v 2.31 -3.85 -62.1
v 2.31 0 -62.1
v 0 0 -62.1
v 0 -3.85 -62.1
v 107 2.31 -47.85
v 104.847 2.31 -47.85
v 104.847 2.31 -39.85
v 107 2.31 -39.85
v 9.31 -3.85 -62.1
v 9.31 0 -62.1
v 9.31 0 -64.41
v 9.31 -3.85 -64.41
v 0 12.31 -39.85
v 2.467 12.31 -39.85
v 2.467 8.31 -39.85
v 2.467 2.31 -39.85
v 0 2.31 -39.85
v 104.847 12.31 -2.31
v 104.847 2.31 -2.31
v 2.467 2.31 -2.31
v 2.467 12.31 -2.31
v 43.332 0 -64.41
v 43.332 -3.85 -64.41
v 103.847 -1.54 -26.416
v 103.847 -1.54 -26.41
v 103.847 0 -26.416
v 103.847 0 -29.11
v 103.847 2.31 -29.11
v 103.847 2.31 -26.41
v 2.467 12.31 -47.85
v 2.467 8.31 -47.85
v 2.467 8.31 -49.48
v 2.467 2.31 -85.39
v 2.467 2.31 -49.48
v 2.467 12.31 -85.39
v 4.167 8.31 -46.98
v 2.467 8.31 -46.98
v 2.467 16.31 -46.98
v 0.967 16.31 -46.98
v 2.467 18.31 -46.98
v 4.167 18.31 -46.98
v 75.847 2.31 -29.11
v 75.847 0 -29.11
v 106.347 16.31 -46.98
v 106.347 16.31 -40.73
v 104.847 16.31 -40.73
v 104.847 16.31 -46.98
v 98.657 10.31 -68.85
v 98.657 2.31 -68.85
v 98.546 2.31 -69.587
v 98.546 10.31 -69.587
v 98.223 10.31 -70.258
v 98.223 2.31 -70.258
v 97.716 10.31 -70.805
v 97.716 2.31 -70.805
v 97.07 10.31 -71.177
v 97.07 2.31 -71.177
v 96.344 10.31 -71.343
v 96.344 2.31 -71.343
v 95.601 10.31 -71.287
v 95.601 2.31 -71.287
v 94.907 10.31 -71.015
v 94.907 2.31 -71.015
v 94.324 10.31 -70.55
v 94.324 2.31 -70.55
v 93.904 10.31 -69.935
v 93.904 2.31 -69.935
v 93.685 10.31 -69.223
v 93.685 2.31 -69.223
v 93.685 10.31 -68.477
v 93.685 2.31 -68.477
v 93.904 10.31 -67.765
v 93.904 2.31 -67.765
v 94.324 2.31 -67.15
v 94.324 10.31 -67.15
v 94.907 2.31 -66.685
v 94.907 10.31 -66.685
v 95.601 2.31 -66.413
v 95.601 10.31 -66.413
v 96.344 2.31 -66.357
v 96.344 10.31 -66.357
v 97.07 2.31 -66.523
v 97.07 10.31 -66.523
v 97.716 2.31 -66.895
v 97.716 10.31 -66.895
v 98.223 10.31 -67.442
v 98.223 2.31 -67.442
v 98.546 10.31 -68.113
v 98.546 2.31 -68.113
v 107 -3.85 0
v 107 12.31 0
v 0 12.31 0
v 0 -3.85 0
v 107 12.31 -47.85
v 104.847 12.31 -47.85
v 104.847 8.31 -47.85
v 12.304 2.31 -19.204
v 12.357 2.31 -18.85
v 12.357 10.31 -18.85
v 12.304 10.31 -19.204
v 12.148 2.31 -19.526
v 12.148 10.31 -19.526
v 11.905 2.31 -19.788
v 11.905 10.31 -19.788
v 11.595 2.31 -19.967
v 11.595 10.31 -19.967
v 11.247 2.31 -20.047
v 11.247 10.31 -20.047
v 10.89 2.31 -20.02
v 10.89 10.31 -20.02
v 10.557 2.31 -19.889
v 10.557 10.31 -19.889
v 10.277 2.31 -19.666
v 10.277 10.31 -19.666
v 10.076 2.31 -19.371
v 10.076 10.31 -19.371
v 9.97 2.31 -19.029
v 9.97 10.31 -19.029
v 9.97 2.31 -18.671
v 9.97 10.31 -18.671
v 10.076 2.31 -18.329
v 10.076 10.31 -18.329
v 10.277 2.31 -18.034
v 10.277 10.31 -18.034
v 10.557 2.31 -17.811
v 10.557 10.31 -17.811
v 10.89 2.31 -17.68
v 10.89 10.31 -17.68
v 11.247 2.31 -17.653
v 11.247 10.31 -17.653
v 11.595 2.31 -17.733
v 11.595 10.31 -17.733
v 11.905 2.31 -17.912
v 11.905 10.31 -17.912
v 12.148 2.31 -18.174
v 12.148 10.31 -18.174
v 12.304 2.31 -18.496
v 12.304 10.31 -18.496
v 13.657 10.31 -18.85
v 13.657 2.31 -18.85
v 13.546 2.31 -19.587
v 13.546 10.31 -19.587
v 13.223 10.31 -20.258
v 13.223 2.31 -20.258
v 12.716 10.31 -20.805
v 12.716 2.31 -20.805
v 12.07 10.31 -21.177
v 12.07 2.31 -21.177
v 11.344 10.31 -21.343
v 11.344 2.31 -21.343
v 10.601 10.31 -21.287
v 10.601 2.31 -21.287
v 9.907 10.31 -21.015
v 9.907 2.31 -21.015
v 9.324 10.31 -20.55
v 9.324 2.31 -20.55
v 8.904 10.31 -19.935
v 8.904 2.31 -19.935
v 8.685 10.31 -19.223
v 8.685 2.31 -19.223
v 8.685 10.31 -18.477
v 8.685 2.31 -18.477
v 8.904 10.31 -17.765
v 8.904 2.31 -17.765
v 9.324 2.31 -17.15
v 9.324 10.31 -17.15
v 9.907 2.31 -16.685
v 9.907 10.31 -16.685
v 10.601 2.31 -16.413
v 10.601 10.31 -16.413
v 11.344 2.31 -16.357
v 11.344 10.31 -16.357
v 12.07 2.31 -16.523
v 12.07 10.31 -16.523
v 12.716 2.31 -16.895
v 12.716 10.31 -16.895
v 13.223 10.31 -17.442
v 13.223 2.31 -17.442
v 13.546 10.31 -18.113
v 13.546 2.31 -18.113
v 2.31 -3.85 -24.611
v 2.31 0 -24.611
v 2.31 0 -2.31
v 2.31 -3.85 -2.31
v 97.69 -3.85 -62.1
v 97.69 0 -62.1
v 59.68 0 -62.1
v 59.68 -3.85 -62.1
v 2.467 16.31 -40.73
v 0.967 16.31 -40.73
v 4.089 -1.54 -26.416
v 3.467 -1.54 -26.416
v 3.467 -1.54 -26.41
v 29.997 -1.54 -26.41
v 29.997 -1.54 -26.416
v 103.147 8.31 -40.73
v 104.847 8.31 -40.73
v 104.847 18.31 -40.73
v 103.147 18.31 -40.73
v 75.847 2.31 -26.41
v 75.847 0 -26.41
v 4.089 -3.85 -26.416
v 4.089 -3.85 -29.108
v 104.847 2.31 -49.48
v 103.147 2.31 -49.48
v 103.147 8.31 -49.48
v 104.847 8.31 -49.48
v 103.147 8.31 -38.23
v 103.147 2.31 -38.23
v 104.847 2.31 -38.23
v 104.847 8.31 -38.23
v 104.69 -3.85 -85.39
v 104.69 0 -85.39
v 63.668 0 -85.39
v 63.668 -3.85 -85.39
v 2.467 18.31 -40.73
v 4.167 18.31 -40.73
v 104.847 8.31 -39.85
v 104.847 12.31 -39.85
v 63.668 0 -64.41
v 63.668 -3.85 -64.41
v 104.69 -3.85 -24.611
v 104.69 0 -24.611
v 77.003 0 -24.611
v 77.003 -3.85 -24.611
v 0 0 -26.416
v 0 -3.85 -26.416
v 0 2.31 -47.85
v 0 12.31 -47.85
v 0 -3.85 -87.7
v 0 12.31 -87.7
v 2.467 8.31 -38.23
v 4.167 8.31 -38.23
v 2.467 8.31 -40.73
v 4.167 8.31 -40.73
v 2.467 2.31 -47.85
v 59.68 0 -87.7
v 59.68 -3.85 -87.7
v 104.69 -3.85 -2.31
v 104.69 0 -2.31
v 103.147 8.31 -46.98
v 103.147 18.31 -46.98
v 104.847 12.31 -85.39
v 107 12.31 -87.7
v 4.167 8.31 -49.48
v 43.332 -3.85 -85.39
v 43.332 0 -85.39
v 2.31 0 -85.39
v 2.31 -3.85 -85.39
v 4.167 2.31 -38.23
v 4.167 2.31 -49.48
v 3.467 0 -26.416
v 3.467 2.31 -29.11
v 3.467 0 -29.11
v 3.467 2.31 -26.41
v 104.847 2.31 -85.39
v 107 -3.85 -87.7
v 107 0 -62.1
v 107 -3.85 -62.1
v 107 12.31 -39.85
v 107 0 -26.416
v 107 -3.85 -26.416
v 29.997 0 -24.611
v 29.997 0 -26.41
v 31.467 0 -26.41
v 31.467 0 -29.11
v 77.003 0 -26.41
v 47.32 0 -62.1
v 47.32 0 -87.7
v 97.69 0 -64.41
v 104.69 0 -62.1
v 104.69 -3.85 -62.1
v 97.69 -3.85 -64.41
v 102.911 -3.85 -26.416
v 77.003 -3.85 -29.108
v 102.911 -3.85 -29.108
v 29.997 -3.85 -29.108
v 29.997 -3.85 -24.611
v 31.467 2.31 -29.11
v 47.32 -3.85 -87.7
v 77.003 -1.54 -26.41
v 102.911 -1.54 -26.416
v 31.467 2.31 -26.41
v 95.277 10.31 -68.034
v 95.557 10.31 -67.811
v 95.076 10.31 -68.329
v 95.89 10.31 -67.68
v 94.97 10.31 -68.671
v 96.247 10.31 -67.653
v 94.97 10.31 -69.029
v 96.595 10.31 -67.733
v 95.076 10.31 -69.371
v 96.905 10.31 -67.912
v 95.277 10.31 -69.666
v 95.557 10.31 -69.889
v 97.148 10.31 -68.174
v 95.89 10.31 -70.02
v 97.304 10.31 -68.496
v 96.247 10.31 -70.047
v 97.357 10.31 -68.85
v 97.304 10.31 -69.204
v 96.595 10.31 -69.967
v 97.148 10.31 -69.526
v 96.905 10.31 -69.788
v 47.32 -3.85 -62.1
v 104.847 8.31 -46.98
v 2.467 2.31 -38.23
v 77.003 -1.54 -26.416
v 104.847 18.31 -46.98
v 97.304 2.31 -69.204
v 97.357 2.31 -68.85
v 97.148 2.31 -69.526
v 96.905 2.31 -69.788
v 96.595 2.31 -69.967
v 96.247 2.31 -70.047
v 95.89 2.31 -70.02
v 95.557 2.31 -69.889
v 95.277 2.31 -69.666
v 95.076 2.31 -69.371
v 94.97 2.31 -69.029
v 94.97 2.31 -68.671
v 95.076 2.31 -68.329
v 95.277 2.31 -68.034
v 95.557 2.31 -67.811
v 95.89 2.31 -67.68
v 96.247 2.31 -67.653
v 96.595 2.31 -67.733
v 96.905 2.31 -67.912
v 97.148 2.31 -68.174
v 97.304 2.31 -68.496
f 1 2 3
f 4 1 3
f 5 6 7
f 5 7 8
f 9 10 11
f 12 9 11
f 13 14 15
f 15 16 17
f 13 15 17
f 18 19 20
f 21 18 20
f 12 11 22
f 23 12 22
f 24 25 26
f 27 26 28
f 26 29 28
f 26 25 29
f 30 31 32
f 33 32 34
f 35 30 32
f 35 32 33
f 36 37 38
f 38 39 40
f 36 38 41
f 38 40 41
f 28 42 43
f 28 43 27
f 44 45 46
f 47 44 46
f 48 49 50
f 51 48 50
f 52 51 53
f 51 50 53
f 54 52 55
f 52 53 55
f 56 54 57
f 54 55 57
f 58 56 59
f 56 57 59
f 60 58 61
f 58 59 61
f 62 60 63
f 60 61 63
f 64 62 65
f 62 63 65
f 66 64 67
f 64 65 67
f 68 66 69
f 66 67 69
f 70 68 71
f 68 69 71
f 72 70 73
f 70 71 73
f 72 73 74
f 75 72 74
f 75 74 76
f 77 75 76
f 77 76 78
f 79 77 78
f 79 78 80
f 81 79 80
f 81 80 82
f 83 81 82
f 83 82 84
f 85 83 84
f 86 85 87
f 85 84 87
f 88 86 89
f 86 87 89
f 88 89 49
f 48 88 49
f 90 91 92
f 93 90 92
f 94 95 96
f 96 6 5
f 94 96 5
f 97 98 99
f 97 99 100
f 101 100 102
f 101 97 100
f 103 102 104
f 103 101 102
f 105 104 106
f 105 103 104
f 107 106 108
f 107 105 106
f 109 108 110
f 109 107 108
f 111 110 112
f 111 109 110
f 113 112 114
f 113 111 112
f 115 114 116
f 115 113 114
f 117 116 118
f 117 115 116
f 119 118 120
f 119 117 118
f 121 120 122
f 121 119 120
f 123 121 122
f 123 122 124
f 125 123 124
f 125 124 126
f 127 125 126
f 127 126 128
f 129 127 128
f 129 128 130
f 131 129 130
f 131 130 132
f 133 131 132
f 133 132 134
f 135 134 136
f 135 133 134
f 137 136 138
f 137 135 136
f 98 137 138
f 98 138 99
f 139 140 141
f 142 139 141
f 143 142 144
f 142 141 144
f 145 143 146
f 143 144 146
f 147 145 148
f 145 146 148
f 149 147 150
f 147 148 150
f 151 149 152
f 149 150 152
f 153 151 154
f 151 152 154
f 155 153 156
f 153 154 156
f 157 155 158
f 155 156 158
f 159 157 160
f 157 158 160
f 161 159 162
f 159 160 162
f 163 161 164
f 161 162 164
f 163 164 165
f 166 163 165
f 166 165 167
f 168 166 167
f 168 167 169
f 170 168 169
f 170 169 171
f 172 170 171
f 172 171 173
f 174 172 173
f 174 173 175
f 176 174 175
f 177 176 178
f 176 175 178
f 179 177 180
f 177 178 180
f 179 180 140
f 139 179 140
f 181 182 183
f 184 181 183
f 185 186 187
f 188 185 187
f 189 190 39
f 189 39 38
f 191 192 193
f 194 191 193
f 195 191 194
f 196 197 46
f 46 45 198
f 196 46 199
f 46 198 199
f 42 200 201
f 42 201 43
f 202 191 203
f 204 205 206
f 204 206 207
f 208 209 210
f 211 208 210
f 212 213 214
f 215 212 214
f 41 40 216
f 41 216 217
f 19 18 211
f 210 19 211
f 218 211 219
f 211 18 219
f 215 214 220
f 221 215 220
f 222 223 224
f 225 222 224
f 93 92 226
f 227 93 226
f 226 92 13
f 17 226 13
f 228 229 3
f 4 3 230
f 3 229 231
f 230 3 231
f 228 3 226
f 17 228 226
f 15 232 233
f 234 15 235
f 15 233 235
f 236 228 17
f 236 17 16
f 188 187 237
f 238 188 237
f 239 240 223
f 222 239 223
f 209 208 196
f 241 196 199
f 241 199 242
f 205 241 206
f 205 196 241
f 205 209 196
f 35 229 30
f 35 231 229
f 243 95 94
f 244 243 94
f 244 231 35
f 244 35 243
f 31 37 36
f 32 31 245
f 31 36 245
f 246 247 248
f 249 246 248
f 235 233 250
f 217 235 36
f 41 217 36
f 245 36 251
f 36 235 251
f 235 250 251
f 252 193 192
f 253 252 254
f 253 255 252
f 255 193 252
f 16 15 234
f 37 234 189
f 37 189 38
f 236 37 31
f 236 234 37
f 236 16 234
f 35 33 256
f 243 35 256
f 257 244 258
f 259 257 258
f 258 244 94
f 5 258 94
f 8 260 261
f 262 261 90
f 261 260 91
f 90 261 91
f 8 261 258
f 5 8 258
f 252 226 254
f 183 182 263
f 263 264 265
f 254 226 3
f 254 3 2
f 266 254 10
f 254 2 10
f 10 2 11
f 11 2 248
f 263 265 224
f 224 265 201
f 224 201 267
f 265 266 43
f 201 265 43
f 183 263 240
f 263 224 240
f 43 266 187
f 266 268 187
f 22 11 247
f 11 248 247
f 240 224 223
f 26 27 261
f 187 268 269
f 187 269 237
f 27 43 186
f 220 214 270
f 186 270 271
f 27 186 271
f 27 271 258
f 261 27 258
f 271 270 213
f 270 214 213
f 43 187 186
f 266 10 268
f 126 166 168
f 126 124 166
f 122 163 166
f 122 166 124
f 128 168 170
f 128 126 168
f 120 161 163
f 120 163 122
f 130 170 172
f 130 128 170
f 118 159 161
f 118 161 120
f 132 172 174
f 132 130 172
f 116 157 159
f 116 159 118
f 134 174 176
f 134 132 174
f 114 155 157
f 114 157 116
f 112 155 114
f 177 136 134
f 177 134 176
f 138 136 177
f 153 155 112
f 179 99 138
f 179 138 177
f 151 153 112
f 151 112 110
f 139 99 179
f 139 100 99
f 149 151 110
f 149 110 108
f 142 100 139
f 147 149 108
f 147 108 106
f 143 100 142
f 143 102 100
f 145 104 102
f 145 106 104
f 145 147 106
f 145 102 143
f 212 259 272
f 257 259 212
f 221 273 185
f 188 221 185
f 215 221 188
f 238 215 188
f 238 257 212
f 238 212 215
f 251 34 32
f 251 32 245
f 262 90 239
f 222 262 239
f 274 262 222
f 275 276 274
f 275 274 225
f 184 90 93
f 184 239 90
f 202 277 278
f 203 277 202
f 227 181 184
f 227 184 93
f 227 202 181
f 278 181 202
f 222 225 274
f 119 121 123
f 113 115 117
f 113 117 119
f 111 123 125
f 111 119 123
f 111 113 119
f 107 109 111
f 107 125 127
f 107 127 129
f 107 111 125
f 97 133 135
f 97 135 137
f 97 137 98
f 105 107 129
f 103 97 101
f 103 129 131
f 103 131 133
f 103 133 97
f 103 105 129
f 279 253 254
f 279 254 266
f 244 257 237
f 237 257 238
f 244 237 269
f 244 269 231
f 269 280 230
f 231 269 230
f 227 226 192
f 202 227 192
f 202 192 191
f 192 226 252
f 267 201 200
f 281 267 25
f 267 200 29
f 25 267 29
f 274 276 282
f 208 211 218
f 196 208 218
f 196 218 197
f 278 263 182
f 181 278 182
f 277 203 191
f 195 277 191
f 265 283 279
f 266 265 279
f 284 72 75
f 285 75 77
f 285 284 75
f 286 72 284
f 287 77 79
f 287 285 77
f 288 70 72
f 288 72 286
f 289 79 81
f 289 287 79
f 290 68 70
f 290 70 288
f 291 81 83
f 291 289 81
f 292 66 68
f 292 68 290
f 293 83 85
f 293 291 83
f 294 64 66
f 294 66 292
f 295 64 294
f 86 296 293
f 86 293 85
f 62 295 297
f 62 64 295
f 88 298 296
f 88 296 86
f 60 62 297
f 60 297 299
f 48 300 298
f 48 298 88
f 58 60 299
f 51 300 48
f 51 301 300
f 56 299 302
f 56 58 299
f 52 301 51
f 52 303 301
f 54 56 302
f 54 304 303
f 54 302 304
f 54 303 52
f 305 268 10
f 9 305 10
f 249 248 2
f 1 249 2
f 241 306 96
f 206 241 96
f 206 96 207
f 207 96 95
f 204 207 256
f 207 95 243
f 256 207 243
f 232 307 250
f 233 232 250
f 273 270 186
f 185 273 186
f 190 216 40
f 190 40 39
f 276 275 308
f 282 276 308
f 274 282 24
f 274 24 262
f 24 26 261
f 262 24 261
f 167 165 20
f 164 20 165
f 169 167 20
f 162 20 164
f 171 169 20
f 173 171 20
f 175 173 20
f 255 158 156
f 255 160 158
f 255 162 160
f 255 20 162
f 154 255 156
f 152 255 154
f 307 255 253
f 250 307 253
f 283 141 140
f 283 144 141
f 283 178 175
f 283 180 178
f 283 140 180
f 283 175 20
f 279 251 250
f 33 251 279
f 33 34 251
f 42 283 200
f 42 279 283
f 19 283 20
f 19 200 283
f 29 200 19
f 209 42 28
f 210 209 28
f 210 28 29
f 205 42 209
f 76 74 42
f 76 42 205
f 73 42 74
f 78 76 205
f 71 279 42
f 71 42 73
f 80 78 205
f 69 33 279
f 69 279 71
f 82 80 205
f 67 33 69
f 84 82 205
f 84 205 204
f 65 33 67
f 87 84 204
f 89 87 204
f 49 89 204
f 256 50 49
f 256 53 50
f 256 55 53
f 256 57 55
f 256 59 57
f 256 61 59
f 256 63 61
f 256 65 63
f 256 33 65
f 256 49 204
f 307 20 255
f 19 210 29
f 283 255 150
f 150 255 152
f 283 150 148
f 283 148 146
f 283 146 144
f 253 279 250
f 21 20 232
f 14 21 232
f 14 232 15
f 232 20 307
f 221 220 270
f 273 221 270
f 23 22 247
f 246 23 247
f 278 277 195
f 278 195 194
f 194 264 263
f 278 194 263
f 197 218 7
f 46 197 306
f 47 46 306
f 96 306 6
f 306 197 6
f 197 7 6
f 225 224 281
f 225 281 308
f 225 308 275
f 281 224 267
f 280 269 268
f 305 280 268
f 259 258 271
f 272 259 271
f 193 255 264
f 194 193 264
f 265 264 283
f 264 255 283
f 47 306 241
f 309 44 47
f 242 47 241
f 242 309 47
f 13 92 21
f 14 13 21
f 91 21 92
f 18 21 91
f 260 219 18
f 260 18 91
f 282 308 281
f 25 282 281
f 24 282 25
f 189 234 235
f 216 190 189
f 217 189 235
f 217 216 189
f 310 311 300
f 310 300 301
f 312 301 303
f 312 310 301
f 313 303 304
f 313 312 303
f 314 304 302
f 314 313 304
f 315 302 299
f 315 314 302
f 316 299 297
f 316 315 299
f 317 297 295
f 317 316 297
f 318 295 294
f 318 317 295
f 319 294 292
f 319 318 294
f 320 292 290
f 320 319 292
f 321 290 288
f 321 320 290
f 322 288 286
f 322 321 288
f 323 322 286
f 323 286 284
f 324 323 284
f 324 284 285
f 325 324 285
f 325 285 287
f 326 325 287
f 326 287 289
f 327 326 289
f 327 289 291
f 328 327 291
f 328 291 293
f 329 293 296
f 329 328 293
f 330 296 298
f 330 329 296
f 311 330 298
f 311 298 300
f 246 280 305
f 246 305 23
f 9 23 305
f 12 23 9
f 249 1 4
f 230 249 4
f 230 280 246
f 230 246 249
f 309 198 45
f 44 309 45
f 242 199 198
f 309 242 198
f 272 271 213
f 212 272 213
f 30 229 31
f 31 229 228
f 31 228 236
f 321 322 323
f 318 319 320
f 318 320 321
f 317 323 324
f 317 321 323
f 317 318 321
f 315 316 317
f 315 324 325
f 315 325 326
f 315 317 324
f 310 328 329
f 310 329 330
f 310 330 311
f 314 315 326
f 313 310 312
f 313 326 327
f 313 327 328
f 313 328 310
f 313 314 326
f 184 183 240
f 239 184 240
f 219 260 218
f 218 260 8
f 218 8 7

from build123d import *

# Parameters (mm, degrees)
SKETCH1_W           = 107
SKETCH1_H           = 87.7
BOSS_EXTRUDE1_DEPTH = 2.31
BOSS_EXTRUDE2_DEPTH = 10
SKETCH3_R           = 2.5
SKETCH3_R_2         = 1.2
BOSS_EXTRUDE3_DEPTH = 8
BOSS_EXTRUDE4_DEPTH = 3.85
SKETCH5_W           = 28
SKETCH5_H           = 2.7
CUT_EXTRUDE1_DEPTH  = 3.85
CUT_EXTRUDE2_DEPTH  = 107
SKETCH7_W           = 1.7
SKETCH7_H           = 11.25
BOSS_EXTRUDE5_DEPTH = 16
SKETCH8_W           = 2.5
SKETCH8_H           = 10
CUT_EXTRUDE3_DEPTH  = 102.38
BOSS_EXTRUDE6_DEPTH = 6.25
BOSS_EXTRUDE7_DEPTH = 6.25


with BuildPart() as part:
    # Sketch1 → Boss-Extrude1 (new body)
    with BuildSketch(Plane(origin=(0, 0, 0), x_dir=(1, 0, 0), z_dir=(0, 1, 0))):
        with Locations((53.5, 43.85)):
            Rectangle(SKETCH1_W, SKETCH1_H)
    extrude(amount=BOSS_EXTRUDE1_DEPTH)

    # Sketch2 → Boss-Extrude2 (add)
    with BuildSketch(Plane(origin=(0, 2.31, 0), x_dir=(1, 0, 0), z_dir=(0, 1, 0))):
        Polygon((0, 47.85), (2.466911691, 47.85), (2.466911691, 85.39), (104.846911691, 85.39), (104.846911691, 47.85), (107, 47.85), (107, 87.7), (0, 87.7), align=None)
        Polygon((0, 0), (107, 0), (107, 39.85), (104.846911691, 39.85), (104.846911691, 2.31), (2.466911691, 2.31), (2.466911691, 39.85), (0, 39.85), align=None)
    extrude(amount=BOSS_EXTRUDE2_DEPTH)

    # Sketch3 → Boss-Extrude3 (add)
    with BuildSketch(Plane(origin=(0, 2.31, 0), x_dir=(1, 0, 0), z_dir=(0, 1, 0))):
        with Locations((11.156911691, 18.85)):
            Circle(SKETCH3_R)
        with Locations((11.156911691, 18.85)):
            Circle(SKETCH3_R_2, mode=Mode.SUBTRACT)
        with Locations((96.156911691, 68.85)):
            Circle(SKETCH3_R)
        with Locations((96.156911691, 68.85)):
            Circle(SKETCH3_R_2, mode=Mode.SUBTRACT)
    extrude(amount=BOSS_EXTRUDE3_DEPTH)

    # Sketch4 → Boss-Extrude4 (add)
    with BuildSketch(Plane(origin=(0, 0, 0), x_dir=(-1, 0, 0), z_dir=(0, -1, 0))):
        Polygon((0, 0), (0, 26.416), (-4.0894, 26.416), (-4.0894, 29.1084), (-29.9974, 29.1084), (-29.9974, 24.6112), (-2.31, 24.6112), (-2.31, 2.31), (-104.69, 2.31), (-104.69, 24.6112), (-77.0026, 24.6112), (-77.0026, 29.1084), (-102.9106, 29.1084), (-102.9106, 26.416), (-107, 26.416), (-107, 0), align=None)
        Polygon((0, 62.1), (0, 87.7), (-47.32, 87.7), (-47.32, 62.1), (-9.31, 62.1), (-9.31, 64.41), (-43.3322, 64.41), (-43.3322, 85.39), (-2.31, 85.39), (-2.31, 62.1), align=None)
        Polygon((-59.68, 87.7), (-107, 87.7), (-107, 62.1), (-104.69, 62.1), (-104.69, 85.39), (-63.6678, 85.39), (-63.6678, 64.41), (-97.69, 64.41), (-97.69, 62.1), (-59.68, 62.1), align=None)
    extrude(amount=BOSS_EXTRUDE4_DEPTH)

    # Sketch5 → Cut-Extrude1 (cut)
    with BuildSketch(Plane(origin=(0, 2.31, 0), x_dir=(1, 0, 0), z_dir=(0, 1, 0))):
        with Locations((17.466911691, 27.76)):
            Rectangle(SKETCH5_W, SKETCH5_H)
        with Locations((89.846911691, 27.76)):
            Rectangle(SKETCH5_W, SKETCH5_H)
    extrude(amount=-CUT_EXTRUDE1_DEPTH, mode=Mode.SUBTRACT)

    # Sketch6 → Cut-Extrude2 (cut)
    with BuildSketch(Plane(origin=(102.9106, 0, 0), x_dir=(0, 0, -1), z_dir=(1, 0, 0))):
        Polygon((29.1084, -3.85), (26.416, -1.54), (29.1084, -1.54), align=None)
    extrude(amount=-CUT_EXTRUDE2_DEPTH, mode=Mode.SUBTRACT)

    # Sketch7 → Boss-Extrude5 (add)
    with BuildSketch(Plane(origin=(0, 2.31, 0), x_dir=(1, 0, 0), z_dir=(0, 1, 0))):
        with Locations((3.316911691, 43.855)):
            Rectangle(SKETCH7_W, SKETCH7_H)
        with Locations((103.996911691, 43.855)):
            Rectangle(SKETCH7_W, SKETCH7_H)
    extrude(amount=BOSS_EXTRUDE5_DEPTH)

    # Sketch8 → Cut-Extrude3 (cut)
    with BuildSketch(Plane(origin=(104.846911691, 0, 0), x_dir=(0, 0, -1), z_dir=(1, 0, 0))):
        with Locations((39.48, 13.31)):
            Rectangle(SKETCH8_W, SKETCH8_H)
        with Locations((48.23, 13.31)):
            Rectangle(SKETCH8_W, SKETCH8_H)
    extrude(amount=-CUT_EXTRUDE3_DEPTH, mode=Mode.SUBTRACT)

    # Sketch9 → Boss-Extrude6 (add)
    with BuildSketch(Plane.XY.offset(-40.73)):
        Polygon((104.846911691, 18.31), (106.346911691, 16.31), (104.846911691, 16.31), align=None)
    extrude(amount=-BOSS_EXTRUDE6_DEPTH)

    # Sketch10 → Boss-Extrude7 (add)
    with BuildSketch(Plane.XY.offset(-40.73)):
        Polygon((0.966911691, 16.31), (2.466911691, 16.31), (2.466911691, 18.31), align=None)
    extrude(amount=-BOSS_EXTRUDE7_DEPTH)


solid = part.part
